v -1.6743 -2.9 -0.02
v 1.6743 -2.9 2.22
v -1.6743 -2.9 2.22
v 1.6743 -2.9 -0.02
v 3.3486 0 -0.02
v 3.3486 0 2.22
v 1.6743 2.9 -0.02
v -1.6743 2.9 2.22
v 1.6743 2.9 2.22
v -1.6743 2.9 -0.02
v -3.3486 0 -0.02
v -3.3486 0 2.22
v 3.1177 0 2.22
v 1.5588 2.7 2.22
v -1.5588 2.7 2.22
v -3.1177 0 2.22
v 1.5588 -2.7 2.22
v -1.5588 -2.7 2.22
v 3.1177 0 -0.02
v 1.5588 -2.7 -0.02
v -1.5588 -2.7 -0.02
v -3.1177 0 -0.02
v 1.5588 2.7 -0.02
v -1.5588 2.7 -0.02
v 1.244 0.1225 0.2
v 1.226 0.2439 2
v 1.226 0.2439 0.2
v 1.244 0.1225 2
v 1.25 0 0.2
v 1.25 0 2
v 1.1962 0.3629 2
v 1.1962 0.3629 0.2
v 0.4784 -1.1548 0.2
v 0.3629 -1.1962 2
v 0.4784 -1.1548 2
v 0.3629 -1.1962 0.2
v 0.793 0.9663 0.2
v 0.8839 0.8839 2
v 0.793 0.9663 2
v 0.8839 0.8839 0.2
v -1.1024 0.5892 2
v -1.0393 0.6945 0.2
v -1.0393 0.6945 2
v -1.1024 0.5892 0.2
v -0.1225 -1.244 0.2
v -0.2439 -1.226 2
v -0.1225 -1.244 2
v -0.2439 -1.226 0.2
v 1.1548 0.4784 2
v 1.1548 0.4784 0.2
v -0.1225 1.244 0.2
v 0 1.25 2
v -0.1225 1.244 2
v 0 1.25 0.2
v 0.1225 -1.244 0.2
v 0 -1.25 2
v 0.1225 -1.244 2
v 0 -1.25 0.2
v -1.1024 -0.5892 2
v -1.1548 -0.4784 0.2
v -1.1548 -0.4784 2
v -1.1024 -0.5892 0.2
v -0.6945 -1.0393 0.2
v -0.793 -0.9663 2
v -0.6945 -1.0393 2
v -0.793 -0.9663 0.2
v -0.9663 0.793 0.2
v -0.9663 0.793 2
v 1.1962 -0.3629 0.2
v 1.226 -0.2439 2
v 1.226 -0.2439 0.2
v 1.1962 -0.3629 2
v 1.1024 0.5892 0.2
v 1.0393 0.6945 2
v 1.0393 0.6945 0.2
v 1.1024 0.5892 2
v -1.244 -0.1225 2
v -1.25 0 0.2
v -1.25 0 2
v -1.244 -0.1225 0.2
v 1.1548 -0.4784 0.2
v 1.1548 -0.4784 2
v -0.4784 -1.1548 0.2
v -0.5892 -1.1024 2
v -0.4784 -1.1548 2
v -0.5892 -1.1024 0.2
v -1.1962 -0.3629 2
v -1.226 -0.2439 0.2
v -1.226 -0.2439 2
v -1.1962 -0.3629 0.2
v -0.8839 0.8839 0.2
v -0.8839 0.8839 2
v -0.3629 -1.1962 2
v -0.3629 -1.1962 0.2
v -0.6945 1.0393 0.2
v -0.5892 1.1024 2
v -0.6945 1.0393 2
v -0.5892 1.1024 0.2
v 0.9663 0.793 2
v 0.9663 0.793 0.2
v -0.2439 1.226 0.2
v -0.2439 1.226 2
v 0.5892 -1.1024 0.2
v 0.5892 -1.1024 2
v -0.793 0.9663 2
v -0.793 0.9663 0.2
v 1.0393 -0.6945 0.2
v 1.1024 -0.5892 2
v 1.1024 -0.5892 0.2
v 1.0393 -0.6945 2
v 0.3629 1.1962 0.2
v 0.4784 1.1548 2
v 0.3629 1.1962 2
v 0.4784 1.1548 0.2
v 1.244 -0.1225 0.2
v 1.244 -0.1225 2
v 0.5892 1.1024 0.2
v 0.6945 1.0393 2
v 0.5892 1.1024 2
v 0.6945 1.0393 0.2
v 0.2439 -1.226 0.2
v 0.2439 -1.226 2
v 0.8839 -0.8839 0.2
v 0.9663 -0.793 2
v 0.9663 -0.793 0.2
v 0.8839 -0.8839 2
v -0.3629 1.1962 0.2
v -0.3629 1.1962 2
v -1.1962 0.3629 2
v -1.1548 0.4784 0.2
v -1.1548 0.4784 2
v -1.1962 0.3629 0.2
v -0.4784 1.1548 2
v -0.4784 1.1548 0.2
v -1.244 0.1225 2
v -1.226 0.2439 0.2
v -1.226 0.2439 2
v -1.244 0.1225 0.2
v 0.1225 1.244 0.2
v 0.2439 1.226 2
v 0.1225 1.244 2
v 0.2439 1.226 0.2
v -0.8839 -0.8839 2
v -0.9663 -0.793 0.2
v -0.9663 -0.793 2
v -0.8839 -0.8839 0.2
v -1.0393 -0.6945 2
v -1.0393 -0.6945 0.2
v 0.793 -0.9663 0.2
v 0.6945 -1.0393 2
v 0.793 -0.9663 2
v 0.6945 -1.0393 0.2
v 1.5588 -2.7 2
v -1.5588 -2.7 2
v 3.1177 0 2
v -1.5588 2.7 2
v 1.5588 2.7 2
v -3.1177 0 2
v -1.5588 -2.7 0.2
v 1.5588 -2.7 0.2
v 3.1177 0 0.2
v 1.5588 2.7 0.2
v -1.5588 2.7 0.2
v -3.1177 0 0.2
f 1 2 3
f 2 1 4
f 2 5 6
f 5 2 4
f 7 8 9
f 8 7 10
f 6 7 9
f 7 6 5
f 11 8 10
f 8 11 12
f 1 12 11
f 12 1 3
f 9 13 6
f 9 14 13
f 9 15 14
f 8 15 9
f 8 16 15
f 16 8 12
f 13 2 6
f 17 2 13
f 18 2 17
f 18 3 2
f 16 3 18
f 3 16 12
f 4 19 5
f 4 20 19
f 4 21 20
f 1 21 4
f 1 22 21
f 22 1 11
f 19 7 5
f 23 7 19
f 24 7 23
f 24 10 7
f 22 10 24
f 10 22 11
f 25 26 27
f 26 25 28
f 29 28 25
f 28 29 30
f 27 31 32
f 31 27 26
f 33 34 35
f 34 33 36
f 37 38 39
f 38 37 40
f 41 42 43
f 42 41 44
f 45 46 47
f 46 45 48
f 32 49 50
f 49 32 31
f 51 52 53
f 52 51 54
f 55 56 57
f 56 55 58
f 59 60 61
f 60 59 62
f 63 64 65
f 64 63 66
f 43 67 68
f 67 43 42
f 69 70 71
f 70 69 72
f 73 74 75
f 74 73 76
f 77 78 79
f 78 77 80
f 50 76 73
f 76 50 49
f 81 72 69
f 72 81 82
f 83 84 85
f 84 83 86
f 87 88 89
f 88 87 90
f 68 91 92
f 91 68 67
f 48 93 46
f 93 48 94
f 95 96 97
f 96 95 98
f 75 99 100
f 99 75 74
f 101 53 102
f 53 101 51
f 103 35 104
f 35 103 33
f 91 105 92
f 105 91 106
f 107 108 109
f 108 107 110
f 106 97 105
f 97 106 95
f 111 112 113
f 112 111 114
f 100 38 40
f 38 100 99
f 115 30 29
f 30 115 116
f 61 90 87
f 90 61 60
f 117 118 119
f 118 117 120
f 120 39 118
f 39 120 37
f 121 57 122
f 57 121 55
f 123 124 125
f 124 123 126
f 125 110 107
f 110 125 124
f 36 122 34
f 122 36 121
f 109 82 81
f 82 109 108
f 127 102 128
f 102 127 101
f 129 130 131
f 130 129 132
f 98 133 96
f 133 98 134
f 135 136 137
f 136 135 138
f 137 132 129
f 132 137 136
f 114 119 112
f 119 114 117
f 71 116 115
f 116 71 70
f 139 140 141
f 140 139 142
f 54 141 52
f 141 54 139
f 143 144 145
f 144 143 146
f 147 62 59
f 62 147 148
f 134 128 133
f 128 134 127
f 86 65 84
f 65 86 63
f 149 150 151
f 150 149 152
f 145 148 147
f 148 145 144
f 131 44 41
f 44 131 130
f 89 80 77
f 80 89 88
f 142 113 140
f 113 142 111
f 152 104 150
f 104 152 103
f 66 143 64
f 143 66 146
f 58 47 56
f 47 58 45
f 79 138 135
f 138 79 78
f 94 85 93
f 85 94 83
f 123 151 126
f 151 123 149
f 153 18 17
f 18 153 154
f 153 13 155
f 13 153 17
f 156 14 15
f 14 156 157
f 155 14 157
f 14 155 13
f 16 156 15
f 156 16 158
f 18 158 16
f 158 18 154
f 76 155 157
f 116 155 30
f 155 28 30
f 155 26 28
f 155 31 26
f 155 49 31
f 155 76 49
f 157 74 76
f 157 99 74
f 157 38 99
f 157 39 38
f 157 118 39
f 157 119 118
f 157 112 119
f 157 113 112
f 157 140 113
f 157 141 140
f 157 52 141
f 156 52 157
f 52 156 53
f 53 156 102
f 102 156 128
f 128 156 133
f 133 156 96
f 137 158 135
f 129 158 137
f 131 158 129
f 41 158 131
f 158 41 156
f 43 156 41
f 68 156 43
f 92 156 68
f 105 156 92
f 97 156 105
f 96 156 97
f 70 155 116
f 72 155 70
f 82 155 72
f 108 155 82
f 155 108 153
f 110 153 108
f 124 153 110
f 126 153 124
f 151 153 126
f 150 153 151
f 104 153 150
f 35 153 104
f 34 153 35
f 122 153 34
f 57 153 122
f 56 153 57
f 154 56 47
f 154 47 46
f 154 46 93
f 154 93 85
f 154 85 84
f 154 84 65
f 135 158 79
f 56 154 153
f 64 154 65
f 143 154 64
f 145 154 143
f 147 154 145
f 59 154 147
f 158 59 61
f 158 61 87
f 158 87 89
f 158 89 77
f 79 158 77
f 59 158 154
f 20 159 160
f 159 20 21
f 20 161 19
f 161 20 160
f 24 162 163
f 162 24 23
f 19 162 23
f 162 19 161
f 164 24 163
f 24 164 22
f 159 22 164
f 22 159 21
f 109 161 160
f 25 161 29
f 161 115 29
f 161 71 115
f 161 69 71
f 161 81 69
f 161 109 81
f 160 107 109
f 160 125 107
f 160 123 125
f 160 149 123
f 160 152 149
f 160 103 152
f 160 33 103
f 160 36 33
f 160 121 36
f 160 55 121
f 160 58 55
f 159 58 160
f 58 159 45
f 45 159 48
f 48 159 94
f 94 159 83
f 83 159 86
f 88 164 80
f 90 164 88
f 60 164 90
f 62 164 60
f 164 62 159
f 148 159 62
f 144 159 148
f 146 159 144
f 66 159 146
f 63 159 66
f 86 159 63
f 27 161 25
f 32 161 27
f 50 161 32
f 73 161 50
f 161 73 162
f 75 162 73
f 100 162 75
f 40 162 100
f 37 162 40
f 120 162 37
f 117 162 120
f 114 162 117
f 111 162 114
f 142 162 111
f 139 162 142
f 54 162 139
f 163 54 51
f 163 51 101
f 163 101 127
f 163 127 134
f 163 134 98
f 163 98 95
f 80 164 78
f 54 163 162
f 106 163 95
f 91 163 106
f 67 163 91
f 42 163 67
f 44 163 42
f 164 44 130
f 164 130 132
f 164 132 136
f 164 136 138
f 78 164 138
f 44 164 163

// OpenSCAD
// Hex nut for M2.5 screw
af = 5.8;          // across flats (mm)
thk = 2.2;         // thickness (mm)
hole_d = 2.5;      // clearance hole (mm)
chamfer_h = 0.2;   // chamfer height (mm)
chamfer_af = 5.4;  // chamfer across flats (mm)

eps = 0.02;

module hex_prism(af_dim, h_dim) {
    // For $fn=6, cylinder(d=...) is across corners.
    // Convert across-flats to across-corners: d_corners = af / cos(30°)
    d_corners = af_dim / cos(30);
    cylinder(d = d_corners, h = h_dim, $fn = 6);
}

difference() {
    union() {
        // Main body
        hex_prism(af, thk);

        // Top chamfer (overlaps into body to ensure one connected solid)
        translate([0, 0, thk - chamfer_h + eps])
            hex_prism(af, chamfer_h);

        // Bottom chamfer (overlaps into body)
        translate([0, 0, -eps])
            hex_prism(af, chamfer_h);
    }

    // Through hole (extends beyond part to guarantee full cut)
    translate([0, 0, -1])
        cylinder(d = hole_d, h = thk + 2, $fn = 64);

    // Chamfer cuts (lead-in) top and bottom
    translate([0, 0, thk - chamfer_h])
        hex_prism(chamfer_af, chamfer_h + 1);

    translate([0, 0, -1])
        hex_prism(chamfer_af, chamfer_h + 1);
}
